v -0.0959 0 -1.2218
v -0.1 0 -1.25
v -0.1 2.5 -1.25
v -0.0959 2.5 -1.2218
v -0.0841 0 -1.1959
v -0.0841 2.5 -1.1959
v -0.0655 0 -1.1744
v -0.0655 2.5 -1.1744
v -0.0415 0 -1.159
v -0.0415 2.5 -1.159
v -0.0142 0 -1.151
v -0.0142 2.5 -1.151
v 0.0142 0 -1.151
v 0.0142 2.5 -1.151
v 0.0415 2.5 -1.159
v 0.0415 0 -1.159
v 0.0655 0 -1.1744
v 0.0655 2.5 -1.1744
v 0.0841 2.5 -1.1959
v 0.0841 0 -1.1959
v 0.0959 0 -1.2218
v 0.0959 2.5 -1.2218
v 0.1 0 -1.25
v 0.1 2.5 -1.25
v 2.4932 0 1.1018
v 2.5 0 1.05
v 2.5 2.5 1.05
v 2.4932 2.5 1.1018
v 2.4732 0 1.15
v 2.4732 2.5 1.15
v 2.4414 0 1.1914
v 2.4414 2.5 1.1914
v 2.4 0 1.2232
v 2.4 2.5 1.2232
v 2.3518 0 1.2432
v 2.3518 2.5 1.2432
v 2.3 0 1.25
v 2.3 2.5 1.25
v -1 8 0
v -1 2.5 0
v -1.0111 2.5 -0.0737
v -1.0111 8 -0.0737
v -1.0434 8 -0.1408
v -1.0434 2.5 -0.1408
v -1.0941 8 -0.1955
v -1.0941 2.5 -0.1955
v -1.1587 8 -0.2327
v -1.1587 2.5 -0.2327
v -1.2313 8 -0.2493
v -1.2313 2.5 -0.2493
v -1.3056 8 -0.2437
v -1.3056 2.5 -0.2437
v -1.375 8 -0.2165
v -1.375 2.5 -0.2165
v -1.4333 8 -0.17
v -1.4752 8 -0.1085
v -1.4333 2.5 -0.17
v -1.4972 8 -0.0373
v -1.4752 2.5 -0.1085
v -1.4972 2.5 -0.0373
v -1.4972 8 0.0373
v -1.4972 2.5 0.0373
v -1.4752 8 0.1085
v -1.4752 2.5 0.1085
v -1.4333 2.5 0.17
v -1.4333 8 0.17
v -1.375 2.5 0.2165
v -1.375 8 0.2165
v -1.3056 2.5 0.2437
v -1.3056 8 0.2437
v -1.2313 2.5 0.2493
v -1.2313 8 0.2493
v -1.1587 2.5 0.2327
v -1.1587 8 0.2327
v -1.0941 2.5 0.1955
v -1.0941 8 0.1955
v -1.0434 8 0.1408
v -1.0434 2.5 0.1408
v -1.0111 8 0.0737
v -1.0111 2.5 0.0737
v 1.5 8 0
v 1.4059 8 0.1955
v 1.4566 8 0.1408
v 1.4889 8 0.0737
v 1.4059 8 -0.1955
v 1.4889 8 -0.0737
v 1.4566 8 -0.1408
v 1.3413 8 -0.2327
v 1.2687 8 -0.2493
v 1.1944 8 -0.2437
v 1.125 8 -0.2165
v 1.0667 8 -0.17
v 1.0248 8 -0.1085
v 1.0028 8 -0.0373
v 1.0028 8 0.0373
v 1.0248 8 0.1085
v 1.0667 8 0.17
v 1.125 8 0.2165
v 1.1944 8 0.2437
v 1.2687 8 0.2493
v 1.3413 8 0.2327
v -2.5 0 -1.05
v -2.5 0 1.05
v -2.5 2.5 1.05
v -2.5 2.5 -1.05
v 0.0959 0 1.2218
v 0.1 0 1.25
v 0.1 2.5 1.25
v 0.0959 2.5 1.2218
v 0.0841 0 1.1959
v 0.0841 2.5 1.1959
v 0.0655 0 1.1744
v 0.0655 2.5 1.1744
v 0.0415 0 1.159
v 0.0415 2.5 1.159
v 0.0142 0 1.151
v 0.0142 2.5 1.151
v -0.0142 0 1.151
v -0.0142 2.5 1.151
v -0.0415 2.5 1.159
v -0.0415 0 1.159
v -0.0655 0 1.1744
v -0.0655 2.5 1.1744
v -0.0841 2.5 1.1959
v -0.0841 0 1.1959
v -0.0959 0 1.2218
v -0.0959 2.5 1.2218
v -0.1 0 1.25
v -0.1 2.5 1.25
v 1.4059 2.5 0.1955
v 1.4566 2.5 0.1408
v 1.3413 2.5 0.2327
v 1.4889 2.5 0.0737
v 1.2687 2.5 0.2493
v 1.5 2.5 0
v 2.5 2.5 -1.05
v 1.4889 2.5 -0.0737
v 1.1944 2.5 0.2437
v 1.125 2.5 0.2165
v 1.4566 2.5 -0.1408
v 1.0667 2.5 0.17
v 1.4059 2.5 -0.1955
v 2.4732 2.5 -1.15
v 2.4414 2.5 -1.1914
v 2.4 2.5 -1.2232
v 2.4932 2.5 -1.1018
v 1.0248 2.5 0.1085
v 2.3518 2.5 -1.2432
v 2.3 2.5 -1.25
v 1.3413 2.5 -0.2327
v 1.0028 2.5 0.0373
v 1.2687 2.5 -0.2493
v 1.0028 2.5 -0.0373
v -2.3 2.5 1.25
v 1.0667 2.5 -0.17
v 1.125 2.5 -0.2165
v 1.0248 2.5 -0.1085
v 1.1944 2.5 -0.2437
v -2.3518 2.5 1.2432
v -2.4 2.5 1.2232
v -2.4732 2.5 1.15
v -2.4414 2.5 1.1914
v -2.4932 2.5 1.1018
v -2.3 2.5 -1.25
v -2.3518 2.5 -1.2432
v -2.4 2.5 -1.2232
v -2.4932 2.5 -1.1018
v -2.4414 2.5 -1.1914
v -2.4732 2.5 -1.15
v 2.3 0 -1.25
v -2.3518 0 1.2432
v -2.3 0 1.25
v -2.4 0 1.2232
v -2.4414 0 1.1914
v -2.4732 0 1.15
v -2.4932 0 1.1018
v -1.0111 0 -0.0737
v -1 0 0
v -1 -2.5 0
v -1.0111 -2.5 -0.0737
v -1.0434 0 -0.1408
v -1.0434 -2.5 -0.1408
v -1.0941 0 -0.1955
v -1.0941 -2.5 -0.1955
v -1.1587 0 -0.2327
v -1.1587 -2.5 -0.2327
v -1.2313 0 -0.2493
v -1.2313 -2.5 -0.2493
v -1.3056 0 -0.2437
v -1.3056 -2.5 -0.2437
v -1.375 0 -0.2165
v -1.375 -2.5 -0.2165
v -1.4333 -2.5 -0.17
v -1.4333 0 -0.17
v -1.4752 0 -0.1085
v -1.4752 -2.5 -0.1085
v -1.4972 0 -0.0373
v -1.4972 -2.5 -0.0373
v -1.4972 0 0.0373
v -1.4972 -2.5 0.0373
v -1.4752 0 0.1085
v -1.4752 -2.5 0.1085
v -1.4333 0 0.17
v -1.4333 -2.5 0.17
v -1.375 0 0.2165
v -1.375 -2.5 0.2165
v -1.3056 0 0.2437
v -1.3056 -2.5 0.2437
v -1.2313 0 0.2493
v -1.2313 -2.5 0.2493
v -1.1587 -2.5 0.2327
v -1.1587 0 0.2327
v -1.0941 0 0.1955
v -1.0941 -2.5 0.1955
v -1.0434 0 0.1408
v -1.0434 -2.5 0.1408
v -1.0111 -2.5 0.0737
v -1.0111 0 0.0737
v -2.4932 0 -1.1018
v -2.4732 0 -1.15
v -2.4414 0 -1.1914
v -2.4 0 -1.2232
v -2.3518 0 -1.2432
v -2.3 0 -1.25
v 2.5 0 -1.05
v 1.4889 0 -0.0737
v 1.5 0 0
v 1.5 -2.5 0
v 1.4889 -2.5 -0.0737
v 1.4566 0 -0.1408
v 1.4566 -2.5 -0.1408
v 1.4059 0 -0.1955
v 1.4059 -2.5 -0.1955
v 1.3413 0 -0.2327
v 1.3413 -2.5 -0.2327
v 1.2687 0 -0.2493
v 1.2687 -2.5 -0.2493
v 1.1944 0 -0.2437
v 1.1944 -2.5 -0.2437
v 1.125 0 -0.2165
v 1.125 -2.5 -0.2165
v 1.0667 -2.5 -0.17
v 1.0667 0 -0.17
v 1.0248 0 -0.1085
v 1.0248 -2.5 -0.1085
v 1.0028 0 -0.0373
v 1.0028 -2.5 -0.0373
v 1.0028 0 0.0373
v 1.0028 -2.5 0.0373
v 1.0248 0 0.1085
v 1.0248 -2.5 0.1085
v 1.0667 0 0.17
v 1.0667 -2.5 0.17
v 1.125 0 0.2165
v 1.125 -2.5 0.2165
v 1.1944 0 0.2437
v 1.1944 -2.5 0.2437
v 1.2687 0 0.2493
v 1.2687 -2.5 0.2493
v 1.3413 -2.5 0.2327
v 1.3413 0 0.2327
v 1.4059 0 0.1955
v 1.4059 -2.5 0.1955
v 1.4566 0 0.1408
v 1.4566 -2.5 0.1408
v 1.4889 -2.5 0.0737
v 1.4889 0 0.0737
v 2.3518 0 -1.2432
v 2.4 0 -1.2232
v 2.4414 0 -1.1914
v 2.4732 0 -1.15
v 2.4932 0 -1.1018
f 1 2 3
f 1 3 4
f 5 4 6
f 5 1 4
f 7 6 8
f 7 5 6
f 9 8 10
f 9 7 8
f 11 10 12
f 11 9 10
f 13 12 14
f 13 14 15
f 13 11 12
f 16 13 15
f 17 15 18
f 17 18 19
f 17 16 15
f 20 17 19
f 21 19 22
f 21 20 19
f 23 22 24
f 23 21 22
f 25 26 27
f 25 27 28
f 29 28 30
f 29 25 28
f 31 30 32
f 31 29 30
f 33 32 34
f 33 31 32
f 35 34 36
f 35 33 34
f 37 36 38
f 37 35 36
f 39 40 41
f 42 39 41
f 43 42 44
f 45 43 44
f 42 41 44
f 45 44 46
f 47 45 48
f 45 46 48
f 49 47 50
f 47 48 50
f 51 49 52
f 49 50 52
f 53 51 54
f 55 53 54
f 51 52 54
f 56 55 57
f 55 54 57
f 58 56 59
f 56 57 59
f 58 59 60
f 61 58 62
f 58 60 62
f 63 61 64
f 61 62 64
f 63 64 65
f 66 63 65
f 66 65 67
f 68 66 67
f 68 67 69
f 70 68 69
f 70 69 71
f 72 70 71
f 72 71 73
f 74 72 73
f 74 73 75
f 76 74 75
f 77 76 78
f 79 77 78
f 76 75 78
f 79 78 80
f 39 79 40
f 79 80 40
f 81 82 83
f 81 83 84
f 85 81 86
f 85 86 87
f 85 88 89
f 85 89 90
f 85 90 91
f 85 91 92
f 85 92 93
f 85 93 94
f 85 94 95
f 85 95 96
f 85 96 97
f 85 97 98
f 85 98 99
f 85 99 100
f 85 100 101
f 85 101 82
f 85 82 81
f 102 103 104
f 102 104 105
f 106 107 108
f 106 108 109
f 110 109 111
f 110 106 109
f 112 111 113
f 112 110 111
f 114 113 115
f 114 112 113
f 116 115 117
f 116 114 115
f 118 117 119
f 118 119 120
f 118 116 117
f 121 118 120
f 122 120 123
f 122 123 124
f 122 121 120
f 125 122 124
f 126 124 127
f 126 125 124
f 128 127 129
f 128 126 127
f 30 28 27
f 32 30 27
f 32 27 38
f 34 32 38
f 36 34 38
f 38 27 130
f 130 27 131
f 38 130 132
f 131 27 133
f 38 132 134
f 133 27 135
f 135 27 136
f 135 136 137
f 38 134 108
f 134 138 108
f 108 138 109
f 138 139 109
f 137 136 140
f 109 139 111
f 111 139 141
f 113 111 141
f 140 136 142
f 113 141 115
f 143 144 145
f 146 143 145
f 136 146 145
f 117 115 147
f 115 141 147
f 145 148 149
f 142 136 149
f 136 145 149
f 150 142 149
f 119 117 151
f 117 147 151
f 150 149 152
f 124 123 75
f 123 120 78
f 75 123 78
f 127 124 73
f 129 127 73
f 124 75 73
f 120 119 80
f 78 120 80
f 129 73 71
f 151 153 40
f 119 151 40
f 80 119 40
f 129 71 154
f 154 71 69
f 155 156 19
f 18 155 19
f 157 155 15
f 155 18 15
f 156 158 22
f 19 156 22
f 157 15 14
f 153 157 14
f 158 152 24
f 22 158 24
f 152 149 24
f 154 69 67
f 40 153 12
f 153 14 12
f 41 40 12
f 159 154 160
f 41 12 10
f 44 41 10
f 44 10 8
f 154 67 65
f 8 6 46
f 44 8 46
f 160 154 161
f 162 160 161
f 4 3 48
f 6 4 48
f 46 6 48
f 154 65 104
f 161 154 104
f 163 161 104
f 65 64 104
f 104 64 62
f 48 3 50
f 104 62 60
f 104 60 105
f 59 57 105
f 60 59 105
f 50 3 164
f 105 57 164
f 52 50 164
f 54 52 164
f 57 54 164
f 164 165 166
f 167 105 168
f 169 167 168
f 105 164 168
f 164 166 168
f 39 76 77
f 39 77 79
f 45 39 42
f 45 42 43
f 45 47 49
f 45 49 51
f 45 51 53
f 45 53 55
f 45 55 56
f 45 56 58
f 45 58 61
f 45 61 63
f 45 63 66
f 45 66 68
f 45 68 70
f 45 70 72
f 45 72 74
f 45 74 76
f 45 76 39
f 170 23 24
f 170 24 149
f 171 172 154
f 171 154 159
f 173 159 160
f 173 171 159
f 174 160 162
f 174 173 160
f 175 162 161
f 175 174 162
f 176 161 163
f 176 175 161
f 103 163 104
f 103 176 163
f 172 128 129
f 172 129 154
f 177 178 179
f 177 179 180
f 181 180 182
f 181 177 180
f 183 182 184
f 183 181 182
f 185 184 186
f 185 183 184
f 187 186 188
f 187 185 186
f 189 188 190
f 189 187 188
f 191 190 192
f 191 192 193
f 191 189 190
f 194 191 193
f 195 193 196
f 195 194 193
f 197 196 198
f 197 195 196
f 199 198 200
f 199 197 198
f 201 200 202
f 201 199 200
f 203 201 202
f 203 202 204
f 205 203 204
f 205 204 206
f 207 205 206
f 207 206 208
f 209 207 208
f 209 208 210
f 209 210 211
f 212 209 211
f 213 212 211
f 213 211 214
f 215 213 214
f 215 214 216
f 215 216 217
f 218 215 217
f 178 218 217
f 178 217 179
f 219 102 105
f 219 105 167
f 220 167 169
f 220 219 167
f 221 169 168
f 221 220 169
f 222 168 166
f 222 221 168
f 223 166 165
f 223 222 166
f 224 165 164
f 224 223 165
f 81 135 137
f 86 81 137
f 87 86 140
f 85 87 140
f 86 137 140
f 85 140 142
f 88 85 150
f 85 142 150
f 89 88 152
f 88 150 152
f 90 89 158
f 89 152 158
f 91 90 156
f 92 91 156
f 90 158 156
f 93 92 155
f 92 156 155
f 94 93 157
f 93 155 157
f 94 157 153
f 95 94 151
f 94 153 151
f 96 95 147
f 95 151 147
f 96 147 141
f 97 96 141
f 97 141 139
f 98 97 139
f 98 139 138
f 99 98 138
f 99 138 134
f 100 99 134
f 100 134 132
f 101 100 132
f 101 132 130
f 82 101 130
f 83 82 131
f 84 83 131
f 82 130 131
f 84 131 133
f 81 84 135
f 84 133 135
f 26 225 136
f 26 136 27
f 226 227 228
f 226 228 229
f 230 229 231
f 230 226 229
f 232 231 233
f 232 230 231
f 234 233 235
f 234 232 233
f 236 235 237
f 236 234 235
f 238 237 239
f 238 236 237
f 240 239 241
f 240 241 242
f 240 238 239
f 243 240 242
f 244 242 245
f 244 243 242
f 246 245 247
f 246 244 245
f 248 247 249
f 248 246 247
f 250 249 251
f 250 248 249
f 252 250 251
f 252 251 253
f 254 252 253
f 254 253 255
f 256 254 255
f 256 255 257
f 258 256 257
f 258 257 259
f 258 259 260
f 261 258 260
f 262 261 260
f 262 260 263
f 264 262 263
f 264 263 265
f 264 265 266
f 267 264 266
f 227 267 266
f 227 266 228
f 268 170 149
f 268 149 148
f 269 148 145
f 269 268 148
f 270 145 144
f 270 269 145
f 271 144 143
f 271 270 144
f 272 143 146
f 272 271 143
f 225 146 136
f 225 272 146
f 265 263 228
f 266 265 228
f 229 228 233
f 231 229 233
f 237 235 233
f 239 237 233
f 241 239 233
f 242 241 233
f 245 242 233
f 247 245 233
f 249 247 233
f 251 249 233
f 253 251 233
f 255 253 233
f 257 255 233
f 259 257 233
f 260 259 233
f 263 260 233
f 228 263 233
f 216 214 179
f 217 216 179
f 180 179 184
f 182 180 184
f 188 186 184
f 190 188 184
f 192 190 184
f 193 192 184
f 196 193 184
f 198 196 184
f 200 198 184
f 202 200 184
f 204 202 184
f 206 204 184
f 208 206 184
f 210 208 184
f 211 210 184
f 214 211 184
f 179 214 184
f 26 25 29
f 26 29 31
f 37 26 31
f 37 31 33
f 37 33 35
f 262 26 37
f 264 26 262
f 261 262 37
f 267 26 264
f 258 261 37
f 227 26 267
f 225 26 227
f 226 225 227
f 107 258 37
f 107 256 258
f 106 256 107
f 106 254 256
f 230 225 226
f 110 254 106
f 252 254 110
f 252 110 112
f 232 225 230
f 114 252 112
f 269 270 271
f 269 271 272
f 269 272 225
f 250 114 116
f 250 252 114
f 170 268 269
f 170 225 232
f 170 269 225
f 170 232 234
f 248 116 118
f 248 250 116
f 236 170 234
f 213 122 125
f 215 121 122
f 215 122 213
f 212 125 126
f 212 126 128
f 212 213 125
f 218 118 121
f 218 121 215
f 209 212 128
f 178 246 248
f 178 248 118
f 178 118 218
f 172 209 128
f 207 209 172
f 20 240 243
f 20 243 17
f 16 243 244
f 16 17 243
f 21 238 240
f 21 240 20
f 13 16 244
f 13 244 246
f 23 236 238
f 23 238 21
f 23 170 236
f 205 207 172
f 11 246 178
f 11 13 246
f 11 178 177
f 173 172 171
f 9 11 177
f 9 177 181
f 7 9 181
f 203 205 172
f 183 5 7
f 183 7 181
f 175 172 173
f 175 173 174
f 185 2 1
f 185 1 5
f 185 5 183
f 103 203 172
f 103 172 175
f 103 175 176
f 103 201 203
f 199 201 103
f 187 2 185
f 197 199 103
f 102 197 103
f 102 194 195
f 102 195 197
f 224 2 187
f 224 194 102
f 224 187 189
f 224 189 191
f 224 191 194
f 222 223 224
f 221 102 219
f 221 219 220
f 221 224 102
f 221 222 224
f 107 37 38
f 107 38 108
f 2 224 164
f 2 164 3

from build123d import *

# Parameters (mm, degrees)
IZIM1_R                          = 0.25
Y_KSEKLIK_EKSTR_ZYON1_DEPTH      = 2.5
IZIM2_R                          = 0.25
Y_KSEKLIK_EKSTR_ZYON2_DEPTH      = 5.5
Y_KSEKLIK_EKSTR_ZYON2_DEPTH_BACK = 5


with BuildPart() as part:
    # Çizim1 → Yükseklik-Ekstrüzyon1 (new body)
    with BuildSketch(Plane(origin=(0, 0, 0), x_dir=(1, 0, 0), z_dir=(0, 1, 0))):
        with BuildLine():
            Line((-2.3, 1.25), (-0.1, 1.25))
            ThreePointArc((-0.1, 1.25), (0, 1.15), (0.1, 1.25))
            Line((0.1, 1.25), (2.3, 1.25))
            ThreePointArc((2.3, 1.25), (2.441421356, 1.191421356), (2.5, 1.05))
            Line((2.5, 1.05), (2.5, -1.05))
            ThreePointArc((2.5, -1.05), (2.441421356, -1.191421356), (2.3, -1.25))
            Line((2.3, -1.25), (0.1, -1.25))
            ThreePointArc((0.1, -1.25), (0, -1.15), (-0.1, -1.25))
            Line((-0.1, -1.25), (-2.3, -1.25))
            ThreePointArc((-2.3, -1.25), (-2.441421356, -1.191421356), (-2.5, -1.05))
            Line((-2.5, -1.05), (-2.5, 1.05))
            ThreePointArc((-2.5, 1.05), (-2.441421356, 1.191421356), (-2.3, 1.25))
        make_face()
        with Locations((-1.25, 0)):
            Circle(IZIM1_R, mode=Mode.SUBTRACT)
        with Locations((1.25, 0)):
            Circle(IZIM1_R, mode=Mode.SUBTRACT)
    extrude(amount=Y_KSEKLIK_EKSTR_ZYON1_DEPTH)

    # Çizim2 → Yükseklik-Ekstrüzyon2 (add, two sides)
    with BuildSketch(Plane(origin=(0, 2.5, 0), x_dir=(1, 0, 0), z_dir=(0, 1, 0))) as y_kseklik_ekstr_zyon2_sk:
        with Locations((-1.25, 0)):
            Circle(IZIM2_R)
        with Locations((1.25, 0)):
            Circle(IZIM2_R)
    extrude(amount=Y_KSEKLIK_EKSTR_ZYON2_DEPTH)
    extrude(y_kseklik_ekstr_zyon2_sk.sketch, amount=-Y_KSEKLIK_EKSTR_ZYON2_DEPTH_BACK)


solid = part.part
